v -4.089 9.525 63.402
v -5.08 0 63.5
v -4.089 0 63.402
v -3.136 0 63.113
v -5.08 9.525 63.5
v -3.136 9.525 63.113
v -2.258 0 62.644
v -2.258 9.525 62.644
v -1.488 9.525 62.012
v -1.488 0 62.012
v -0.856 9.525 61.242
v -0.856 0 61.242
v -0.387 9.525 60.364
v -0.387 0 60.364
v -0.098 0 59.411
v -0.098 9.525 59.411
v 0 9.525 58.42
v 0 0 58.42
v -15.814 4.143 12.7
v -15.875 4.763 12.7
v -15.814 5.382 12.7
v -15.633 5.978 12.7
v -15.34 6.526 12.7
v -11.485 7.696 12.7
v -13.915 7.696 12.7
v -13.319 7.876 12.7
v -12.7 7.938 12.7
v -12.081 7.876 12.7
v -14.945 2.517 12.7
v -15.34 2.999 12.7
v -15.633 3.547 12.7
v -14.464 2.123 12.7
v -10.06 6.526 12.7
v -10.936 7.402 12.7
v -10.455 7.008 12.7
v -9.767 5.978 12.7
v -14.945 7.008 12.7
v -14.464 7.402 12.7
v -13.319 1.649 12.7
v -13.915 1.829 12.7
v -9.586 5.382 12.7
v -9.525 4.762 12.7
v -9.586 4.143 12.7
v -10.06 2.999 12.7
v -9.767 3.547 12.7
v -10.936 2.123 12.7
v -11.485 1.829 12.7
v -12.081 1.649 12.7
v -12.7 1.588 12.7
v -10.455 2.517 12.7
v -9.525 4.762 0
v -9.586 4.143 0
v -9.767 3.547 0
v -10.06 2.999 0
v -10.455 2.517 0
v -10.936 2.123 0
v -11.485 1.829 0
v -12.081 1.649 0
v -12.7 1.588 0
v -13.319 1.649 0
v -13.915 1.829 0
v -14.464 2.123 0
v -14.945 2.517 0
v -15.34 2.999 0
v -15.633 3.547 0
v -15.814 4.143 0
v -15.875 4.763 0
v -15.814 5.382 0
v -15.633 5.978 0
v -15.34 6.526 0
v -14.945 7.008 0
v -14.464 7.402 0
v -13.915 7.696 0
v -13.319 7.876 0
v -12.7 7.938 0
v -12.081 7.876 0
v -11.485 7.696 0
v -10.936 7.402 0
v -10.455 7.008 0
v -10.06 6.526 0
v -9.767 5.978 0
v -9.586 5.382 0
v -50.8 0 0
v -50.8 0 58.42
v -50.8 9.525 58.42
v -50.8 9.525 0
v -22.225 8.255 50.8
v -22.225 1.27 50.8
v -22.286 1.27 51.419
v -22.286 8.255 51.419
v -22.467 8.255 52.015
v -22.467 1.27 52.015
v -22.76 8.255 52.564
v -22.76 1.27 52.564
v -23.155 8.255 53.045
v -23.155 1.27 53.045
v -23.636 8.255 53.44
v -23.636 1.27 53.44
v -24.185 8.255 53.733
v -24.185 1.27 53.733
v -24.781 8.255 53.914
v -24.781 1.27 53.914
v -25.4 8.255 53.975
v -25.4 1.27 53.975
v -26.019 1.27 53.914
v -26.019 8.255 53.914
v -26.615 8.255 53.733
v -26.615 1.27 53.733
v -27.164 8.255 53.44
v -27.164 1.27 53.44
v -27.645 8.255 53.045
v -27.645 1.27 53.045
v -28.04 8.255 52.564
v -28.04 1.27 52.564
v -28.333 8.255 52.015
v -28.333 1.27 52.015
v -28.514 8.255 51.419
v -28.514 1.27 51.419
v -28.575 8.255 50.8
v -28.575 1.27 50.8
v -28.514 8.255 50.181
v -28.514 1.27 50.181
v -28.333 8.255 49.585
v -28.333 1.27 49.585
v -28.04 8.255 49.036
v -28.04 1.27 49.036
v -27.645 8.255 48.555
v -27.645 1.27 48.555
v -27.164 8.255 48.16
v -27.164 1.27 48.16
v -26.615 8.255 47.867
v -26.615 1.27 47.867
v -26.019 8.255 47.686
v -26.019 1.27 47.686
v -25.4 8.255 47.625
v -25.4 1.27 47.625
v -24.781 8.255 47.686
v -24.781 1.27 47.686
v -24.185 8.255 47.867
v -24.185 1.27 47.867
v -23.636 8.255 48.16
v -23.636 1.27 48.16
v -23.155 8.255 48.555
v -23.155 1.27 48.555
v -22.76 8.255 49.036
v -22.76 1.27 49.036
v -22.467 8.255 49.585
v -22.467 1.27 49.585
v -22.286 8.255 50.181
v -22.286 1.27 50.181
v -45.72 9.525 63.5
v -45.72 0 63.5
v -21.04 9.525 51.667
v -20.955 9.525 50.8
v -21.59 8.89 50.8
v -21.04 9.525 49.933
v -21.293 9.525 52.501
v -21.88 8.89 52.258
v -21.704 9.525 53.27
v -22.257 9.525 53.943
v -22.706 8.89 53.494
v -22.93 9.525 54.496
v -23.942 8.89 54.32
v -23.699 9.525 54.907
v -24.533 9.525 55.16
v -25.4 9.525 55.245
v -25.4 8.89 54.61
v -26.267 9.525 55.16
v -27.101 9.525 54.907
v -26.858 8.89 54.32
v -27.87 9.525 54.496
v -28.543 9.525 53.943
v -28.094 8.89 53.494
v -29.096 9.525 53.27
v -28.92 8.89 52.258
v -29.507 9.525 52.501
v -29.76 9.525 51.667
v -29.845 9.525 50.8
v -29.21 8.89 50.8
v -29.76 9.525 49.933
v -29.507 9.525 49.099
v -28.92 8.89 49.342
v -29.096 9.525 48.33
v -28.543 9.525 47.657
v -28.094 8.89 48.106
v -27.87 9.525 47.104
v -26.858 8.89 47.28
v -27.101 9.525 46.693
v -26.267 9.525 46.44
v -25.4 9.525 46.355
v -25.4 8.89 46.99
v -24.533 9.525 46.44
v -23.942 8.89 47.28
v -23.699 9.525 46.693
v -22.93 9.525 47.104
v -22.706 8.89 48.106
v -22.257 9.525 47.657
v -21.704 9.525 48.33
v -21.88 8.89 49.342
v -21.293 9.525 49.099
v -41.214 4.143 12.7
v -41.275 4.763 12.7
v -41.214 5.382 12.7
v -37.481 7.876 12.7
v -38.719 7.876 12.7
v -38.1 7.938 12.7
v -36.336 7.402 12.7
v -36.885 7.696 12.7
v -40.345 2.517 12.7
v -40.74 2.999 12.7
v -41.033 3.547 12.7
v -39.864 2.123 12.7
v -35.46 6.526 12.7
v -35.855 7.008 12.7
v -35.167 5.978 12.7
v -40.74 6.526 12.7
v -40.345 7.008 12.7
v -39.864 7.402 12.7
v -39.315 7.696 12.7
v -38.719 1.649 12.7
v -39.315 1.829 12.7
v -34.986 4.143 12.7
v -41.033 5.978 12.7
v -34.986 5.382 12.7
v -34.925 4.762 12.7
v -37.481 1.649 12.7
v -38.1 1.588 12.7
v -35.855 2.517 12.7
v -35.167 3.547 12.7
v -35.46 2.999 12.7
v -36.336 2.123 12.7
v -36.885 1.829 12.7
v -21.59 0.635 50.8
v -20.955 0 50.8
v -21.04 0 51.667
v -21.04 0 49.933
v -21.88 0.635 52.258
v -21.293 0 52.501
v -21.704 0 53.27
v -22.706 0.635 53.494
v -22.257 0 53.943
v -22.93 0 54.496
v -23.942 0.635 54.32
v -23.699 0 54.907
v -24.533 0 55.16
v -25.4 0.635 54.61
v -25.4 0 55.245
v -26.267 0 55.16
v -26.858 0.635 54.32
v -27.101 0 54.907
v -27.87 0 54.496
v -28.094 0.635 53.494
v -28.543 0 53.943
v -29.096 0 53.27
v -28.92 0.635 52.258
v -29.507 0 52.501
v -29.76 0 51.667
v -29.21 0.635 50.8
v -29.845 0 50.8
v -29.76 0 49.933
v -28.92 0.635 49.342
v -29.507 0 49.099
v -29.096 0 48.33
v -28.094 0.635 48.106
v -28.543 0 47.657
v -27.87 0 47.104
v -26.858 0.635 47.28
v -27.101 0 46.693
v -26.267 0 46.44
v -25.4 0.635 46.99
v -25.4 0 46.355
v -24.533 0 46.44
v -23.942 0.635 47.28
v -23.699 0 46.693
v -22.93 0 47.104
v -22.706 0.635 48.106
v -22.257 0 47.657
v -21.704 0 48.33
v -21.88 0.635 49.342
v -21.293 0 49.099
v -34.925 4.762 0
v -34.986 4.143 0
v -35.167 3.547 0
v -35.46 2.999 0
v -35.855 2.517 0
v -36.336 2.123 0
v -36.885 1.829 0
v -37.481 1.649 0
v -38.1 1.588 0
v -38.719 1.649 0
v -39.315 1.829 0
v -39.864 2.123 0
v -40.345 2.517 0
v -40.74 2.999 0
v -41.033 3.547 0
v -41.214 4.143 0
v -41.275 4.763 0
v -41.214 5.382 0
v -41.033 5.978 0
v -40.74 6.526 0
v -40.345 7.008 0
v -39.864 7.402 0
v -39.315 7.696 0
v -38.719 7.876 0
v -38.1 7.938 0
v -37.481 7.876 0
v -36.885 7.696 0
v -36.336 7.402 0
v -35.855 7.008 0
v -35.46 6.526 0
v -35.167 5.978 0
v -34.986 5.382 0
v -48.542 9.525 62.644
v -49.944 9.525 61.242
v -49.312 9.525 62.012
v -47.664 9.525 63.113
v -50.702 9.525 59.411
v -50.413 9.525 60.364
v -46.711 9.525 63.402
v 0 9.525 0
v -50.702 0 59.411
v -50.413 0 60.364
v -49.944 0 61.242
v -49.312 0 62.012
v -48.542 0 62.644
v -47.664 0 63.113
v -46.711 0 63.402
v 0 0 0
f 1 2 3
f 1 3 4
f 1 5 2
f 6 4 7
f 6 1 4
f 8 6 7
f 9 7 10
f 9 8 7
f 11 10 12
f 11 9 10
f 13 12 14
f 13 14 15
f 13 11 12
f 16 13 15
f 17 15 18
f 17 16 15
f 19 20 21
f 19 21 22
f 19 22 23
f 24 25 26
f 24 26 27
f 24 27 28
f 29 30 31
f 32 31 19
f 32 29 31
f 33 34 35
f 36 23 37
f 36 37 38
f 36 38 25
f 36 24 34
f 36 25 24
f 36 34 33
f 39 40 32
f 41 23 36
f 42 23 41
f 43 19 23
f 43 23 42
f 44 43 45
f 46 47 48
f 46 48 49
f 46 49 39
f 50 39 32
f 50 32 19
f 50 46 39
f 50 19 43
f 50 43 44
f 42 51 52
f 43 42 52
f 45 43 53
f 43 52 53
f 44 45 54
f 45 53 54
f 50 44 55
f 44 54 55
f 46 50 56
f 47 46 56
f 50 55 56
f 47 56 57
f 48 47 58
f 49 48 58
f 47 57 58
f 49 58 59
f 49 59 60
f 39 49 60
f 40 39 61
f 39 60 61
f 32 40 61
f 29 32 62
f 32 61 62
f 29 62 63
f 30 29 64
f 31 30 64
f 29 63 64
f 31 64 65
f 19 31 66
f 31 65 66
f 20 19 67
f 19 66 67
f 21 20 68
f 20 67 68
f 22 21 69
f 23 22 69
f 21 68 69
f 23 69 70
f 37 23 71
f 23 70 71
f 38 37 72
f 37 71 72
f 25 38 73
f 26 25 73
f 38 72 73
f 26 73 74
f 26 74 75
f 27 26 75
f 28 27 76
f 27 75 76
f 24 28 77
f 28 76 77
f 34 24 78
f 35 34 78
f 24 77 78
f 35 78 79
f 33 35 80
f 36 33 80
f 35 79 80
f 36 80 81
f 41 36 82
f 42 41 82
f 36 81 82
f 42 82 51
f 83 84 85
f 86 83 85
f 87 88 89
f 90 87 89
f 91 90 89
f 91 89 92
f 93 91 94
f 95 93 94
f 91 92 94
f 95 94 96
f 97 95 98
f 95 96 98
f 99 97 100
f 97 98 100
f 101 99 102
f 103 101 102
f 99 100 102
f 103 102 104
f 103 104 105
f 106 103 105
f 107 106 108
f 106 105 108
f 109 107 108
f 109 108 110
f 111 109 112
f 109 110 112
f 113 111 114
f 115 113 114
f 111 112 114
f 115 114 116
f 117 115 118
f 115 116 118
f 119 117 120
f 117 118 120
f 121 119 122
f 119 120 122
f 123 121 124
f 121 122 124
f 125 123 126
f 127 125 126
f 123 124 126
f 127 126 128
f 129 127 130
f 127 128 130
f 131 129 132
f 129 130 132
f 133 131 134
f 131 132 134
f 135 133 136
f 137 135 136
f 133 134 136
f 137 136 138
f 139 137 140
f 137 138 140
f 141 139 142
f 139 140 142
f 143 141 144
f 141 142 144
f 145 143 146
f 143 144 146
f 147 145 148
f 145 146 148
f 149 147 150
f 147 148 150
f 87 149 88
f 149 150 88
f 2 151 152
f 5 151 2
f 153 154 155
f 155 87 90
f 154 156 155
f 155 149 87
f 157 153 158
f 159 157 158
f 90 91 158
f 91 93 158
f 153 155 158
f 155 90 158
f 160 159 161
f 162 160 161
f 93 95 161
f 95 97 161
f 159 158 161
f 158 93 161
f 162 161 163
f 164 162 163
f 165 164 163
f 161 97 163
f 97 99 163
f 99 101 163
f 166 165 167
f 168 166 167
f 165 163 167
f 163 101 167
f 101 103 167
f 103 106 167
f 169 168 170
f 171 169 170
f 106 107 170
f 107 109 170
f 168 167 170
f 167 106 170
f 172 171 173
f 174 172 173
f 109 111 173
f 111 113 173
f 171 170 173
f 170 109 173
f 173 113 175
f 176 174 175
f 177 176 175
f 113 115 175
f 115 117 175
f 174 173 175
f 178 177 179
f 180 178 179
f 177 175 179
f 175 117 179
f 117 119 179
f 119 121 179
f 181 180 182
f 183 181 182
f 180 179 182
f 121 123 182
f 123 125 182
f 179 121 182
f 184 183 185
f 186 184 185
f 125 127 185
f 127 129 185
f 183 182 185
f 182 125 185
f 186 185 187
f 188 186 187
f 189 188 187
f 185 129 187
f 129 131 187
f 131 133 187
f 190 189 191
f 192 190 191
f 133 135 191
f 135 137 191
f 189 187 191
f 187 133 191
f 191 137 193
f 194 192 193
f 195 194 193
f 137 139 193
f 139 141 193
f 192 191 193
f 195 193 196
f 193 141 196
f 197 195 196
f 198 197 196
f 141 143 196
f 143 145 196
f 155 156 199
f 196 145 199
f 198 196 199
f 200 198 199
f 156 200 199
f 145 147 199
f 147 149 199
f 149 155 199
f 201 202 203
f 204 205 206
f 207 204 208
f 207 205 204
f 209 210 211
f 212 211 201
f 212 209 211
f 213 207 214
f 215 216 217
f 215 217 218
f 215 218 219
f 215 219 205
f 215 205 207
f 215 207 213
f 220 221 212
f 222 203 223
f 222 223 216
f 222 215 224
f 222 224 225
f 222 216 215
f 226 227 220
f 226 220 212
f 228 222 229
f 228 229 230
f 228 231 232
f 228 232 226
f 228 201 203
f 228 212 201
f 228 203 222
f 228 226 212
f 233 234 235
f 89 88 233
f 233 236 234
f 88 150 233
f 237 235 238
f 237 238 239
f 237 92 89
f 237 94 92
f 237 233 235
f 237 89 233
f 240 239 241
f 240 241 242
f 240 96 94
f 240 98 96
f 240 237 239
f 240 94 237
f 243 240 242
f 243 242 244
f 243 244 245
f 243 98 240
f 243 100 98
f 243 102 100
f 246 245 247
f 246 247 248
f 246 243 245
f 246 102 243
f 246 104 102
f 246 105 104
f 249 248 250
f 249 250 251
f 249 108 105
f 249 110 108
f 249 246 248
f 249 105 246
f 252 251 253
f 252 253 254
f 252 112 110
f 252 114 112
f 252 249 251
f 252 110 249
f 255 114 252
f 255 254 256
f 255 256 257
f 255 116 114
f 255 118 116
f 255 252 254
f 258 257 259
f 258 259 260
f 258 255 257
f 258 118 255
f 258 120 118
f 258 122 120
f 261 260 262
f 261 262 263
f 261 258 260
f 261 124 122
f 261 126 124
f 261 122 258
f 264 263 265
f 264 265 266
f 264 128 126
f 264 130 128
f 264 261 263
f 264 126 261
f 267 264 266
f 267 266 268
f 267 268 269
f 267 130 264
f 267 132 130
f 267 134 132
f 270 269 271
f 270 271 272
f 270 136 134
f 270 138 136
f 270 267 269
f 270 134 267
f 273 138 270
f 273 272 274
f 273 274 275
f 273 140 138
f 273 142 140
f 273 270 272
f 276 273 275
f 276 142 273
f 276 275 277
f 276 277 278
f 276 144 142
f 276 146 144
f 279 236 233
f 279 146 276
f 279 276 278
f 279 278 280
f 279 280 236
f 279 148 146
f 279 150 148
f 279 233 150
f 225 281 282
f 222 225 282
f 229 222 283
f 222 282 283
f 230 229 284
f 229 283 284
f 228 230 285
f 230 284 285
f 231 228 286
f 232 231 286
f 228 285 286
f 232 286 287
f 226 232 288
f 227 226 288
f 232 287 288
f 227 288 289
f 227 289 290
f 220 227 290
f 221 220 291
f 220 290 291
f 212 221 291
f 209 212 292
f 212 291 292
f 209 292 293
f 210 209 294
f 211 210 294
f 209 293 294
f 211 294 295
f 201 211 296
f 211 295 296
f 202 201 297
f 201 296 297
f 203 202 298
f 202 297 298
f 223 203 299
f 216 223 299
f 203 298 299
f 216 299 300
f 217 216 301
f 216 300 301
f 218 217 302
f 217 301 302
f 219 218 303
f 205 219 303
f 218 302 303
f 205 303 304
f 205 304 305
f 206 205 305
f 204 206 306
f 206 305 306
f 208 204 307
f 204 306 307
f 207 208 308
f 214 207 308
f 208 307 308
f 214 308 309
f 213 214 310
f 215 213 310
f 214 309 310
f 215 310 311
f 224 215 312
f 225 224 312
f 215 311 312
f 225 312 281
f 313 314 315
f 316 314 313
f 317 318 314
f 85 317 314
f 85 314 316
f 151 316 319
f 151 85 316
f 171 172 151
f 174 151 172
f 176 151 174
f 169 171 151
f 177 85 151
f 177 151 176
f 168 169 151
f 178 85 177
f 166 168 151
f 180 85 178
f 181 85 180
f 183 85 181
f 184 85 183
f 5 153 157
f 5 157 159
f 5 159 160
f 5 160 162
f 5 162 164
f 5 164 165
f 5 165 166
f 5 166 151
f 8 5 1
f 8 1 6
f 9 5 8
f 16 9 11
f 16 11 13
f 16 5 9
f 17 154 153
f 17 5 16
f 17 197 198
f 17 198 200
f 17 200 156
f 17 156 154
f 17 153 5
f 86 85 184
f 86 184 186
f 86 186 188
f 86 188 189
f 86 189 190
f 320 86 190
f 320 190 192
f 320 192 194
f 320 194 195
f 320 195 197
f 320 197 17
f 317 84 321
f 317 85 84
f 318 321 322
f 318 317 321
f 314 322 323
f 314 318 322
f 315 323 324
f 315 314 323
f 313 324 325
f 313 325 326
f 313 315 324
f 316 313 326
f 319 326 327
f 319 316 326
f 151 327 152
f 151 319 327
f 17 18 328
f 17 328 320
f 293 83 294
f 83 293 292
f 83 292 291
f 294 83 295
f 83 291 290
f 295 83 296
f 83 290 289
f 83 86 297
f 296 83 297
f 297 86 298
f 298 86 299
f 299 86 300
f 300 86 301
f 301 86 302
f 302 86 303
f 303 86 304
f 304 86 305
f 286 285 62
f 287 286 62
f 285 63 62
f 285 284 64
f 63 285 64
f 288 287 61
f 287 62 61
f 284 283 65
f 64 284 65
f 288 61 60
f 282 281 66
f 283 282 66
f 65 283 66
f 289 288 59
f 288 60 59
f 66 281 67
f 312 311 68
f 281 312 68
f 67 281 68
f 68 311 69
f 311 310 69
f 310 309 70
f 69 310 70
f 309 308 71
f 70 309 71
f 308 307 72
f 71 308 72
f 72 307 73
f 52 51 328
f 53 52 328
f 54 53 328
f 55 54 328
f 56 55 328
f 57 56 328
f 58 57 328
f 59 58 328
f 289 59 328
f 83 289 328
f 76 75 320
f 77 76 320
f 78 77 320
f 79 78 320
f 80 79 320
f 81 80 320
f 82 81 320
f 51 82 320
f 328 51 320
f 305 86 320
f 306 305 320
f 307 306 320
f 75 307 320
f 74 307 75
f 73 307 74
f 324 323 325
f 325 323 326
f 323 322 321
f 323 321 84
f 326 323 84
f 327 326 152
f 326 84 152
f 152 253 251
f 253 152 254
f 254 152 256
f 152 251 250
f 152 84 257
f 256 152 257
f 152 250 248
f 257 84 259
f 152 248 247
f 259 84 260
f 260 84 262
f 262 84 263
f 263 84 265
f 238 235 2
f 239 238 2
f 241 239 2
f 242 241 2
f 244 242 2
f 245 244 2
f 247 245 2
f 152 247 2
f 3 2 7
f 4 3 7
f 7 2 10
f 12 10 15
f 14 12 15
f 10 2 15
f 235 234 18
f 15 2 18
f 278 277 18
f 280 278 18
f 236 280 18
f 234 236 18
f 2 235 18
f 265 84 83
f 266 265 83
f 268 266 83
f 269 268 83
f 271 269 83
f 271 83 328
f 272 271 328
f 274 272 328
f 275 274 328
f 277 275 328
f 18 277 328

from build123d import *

# Parameters (mm, degrees)
F0_W     = 50.8
F0_H     = 9.525
F1_DEPTH = 63.5
F2_R     = 3.175
F3_DEPTH = 9.525
F4_R     = 3.175
F5_DEPTH = 12.7
F6_R     = 5.08
F7_SIZE  = 1.27


# Not quite as in the source:
# - a length typed as a fraction of an inch, garbled in the dataset ("3 / 203.2 mm" for 3/8 in), is restored


with BuildPart() as f1:
    # F0 (on Top) → F1 (new body)
    with BuildSketch(Plane.XY):
        with Locations((-25.4, 4.7625)):
            Rectangle(F0_W, F0_H)
    extrude(amount=F1_DEPTH)

    # F2 (on face) → F3 (cut)
    with BuildSketch(Plane.XZ):
        with Locations((-25.4, 50.8)):
            Circle(F2_R)
    extrude(amount=-F3_DEPTH, mode=Mode.SUBTRACT)

    # F4 (on face) → F5 (cut)
    with BuildSketch(Plane(origin=(0, 0, 0), x_dir=(1, 0, 0), z_dir=(0, 0, -1))):
        with Locations((-38.1, -4.7625)):
            Circle(F4_R)
        with Locations((-12.7, -4.7625)):
            Circle(F4_R)
    extrude(amount=-F5_DEPTH, mode=Mode.SUBTRACT)

    # F6
    f6_edges = [f1.edges().sort_by_distance(p)[0] for p in [
        (-50.8, 4.7625, 63.5),
        (0, 4.7625, 63.5),
    ]]
    fillet(f6_edges, radius=F6_R)

    # F7
    f7_edges = [f1.edges().sort_by_distance(p)[0] for p in [
        (-28.575, 0, 50.8),
        (-28.575, 9.525, 50.8),
    ]]
    chamfer(f7_edges, length=F7_SIZE)


solid = f1.part
